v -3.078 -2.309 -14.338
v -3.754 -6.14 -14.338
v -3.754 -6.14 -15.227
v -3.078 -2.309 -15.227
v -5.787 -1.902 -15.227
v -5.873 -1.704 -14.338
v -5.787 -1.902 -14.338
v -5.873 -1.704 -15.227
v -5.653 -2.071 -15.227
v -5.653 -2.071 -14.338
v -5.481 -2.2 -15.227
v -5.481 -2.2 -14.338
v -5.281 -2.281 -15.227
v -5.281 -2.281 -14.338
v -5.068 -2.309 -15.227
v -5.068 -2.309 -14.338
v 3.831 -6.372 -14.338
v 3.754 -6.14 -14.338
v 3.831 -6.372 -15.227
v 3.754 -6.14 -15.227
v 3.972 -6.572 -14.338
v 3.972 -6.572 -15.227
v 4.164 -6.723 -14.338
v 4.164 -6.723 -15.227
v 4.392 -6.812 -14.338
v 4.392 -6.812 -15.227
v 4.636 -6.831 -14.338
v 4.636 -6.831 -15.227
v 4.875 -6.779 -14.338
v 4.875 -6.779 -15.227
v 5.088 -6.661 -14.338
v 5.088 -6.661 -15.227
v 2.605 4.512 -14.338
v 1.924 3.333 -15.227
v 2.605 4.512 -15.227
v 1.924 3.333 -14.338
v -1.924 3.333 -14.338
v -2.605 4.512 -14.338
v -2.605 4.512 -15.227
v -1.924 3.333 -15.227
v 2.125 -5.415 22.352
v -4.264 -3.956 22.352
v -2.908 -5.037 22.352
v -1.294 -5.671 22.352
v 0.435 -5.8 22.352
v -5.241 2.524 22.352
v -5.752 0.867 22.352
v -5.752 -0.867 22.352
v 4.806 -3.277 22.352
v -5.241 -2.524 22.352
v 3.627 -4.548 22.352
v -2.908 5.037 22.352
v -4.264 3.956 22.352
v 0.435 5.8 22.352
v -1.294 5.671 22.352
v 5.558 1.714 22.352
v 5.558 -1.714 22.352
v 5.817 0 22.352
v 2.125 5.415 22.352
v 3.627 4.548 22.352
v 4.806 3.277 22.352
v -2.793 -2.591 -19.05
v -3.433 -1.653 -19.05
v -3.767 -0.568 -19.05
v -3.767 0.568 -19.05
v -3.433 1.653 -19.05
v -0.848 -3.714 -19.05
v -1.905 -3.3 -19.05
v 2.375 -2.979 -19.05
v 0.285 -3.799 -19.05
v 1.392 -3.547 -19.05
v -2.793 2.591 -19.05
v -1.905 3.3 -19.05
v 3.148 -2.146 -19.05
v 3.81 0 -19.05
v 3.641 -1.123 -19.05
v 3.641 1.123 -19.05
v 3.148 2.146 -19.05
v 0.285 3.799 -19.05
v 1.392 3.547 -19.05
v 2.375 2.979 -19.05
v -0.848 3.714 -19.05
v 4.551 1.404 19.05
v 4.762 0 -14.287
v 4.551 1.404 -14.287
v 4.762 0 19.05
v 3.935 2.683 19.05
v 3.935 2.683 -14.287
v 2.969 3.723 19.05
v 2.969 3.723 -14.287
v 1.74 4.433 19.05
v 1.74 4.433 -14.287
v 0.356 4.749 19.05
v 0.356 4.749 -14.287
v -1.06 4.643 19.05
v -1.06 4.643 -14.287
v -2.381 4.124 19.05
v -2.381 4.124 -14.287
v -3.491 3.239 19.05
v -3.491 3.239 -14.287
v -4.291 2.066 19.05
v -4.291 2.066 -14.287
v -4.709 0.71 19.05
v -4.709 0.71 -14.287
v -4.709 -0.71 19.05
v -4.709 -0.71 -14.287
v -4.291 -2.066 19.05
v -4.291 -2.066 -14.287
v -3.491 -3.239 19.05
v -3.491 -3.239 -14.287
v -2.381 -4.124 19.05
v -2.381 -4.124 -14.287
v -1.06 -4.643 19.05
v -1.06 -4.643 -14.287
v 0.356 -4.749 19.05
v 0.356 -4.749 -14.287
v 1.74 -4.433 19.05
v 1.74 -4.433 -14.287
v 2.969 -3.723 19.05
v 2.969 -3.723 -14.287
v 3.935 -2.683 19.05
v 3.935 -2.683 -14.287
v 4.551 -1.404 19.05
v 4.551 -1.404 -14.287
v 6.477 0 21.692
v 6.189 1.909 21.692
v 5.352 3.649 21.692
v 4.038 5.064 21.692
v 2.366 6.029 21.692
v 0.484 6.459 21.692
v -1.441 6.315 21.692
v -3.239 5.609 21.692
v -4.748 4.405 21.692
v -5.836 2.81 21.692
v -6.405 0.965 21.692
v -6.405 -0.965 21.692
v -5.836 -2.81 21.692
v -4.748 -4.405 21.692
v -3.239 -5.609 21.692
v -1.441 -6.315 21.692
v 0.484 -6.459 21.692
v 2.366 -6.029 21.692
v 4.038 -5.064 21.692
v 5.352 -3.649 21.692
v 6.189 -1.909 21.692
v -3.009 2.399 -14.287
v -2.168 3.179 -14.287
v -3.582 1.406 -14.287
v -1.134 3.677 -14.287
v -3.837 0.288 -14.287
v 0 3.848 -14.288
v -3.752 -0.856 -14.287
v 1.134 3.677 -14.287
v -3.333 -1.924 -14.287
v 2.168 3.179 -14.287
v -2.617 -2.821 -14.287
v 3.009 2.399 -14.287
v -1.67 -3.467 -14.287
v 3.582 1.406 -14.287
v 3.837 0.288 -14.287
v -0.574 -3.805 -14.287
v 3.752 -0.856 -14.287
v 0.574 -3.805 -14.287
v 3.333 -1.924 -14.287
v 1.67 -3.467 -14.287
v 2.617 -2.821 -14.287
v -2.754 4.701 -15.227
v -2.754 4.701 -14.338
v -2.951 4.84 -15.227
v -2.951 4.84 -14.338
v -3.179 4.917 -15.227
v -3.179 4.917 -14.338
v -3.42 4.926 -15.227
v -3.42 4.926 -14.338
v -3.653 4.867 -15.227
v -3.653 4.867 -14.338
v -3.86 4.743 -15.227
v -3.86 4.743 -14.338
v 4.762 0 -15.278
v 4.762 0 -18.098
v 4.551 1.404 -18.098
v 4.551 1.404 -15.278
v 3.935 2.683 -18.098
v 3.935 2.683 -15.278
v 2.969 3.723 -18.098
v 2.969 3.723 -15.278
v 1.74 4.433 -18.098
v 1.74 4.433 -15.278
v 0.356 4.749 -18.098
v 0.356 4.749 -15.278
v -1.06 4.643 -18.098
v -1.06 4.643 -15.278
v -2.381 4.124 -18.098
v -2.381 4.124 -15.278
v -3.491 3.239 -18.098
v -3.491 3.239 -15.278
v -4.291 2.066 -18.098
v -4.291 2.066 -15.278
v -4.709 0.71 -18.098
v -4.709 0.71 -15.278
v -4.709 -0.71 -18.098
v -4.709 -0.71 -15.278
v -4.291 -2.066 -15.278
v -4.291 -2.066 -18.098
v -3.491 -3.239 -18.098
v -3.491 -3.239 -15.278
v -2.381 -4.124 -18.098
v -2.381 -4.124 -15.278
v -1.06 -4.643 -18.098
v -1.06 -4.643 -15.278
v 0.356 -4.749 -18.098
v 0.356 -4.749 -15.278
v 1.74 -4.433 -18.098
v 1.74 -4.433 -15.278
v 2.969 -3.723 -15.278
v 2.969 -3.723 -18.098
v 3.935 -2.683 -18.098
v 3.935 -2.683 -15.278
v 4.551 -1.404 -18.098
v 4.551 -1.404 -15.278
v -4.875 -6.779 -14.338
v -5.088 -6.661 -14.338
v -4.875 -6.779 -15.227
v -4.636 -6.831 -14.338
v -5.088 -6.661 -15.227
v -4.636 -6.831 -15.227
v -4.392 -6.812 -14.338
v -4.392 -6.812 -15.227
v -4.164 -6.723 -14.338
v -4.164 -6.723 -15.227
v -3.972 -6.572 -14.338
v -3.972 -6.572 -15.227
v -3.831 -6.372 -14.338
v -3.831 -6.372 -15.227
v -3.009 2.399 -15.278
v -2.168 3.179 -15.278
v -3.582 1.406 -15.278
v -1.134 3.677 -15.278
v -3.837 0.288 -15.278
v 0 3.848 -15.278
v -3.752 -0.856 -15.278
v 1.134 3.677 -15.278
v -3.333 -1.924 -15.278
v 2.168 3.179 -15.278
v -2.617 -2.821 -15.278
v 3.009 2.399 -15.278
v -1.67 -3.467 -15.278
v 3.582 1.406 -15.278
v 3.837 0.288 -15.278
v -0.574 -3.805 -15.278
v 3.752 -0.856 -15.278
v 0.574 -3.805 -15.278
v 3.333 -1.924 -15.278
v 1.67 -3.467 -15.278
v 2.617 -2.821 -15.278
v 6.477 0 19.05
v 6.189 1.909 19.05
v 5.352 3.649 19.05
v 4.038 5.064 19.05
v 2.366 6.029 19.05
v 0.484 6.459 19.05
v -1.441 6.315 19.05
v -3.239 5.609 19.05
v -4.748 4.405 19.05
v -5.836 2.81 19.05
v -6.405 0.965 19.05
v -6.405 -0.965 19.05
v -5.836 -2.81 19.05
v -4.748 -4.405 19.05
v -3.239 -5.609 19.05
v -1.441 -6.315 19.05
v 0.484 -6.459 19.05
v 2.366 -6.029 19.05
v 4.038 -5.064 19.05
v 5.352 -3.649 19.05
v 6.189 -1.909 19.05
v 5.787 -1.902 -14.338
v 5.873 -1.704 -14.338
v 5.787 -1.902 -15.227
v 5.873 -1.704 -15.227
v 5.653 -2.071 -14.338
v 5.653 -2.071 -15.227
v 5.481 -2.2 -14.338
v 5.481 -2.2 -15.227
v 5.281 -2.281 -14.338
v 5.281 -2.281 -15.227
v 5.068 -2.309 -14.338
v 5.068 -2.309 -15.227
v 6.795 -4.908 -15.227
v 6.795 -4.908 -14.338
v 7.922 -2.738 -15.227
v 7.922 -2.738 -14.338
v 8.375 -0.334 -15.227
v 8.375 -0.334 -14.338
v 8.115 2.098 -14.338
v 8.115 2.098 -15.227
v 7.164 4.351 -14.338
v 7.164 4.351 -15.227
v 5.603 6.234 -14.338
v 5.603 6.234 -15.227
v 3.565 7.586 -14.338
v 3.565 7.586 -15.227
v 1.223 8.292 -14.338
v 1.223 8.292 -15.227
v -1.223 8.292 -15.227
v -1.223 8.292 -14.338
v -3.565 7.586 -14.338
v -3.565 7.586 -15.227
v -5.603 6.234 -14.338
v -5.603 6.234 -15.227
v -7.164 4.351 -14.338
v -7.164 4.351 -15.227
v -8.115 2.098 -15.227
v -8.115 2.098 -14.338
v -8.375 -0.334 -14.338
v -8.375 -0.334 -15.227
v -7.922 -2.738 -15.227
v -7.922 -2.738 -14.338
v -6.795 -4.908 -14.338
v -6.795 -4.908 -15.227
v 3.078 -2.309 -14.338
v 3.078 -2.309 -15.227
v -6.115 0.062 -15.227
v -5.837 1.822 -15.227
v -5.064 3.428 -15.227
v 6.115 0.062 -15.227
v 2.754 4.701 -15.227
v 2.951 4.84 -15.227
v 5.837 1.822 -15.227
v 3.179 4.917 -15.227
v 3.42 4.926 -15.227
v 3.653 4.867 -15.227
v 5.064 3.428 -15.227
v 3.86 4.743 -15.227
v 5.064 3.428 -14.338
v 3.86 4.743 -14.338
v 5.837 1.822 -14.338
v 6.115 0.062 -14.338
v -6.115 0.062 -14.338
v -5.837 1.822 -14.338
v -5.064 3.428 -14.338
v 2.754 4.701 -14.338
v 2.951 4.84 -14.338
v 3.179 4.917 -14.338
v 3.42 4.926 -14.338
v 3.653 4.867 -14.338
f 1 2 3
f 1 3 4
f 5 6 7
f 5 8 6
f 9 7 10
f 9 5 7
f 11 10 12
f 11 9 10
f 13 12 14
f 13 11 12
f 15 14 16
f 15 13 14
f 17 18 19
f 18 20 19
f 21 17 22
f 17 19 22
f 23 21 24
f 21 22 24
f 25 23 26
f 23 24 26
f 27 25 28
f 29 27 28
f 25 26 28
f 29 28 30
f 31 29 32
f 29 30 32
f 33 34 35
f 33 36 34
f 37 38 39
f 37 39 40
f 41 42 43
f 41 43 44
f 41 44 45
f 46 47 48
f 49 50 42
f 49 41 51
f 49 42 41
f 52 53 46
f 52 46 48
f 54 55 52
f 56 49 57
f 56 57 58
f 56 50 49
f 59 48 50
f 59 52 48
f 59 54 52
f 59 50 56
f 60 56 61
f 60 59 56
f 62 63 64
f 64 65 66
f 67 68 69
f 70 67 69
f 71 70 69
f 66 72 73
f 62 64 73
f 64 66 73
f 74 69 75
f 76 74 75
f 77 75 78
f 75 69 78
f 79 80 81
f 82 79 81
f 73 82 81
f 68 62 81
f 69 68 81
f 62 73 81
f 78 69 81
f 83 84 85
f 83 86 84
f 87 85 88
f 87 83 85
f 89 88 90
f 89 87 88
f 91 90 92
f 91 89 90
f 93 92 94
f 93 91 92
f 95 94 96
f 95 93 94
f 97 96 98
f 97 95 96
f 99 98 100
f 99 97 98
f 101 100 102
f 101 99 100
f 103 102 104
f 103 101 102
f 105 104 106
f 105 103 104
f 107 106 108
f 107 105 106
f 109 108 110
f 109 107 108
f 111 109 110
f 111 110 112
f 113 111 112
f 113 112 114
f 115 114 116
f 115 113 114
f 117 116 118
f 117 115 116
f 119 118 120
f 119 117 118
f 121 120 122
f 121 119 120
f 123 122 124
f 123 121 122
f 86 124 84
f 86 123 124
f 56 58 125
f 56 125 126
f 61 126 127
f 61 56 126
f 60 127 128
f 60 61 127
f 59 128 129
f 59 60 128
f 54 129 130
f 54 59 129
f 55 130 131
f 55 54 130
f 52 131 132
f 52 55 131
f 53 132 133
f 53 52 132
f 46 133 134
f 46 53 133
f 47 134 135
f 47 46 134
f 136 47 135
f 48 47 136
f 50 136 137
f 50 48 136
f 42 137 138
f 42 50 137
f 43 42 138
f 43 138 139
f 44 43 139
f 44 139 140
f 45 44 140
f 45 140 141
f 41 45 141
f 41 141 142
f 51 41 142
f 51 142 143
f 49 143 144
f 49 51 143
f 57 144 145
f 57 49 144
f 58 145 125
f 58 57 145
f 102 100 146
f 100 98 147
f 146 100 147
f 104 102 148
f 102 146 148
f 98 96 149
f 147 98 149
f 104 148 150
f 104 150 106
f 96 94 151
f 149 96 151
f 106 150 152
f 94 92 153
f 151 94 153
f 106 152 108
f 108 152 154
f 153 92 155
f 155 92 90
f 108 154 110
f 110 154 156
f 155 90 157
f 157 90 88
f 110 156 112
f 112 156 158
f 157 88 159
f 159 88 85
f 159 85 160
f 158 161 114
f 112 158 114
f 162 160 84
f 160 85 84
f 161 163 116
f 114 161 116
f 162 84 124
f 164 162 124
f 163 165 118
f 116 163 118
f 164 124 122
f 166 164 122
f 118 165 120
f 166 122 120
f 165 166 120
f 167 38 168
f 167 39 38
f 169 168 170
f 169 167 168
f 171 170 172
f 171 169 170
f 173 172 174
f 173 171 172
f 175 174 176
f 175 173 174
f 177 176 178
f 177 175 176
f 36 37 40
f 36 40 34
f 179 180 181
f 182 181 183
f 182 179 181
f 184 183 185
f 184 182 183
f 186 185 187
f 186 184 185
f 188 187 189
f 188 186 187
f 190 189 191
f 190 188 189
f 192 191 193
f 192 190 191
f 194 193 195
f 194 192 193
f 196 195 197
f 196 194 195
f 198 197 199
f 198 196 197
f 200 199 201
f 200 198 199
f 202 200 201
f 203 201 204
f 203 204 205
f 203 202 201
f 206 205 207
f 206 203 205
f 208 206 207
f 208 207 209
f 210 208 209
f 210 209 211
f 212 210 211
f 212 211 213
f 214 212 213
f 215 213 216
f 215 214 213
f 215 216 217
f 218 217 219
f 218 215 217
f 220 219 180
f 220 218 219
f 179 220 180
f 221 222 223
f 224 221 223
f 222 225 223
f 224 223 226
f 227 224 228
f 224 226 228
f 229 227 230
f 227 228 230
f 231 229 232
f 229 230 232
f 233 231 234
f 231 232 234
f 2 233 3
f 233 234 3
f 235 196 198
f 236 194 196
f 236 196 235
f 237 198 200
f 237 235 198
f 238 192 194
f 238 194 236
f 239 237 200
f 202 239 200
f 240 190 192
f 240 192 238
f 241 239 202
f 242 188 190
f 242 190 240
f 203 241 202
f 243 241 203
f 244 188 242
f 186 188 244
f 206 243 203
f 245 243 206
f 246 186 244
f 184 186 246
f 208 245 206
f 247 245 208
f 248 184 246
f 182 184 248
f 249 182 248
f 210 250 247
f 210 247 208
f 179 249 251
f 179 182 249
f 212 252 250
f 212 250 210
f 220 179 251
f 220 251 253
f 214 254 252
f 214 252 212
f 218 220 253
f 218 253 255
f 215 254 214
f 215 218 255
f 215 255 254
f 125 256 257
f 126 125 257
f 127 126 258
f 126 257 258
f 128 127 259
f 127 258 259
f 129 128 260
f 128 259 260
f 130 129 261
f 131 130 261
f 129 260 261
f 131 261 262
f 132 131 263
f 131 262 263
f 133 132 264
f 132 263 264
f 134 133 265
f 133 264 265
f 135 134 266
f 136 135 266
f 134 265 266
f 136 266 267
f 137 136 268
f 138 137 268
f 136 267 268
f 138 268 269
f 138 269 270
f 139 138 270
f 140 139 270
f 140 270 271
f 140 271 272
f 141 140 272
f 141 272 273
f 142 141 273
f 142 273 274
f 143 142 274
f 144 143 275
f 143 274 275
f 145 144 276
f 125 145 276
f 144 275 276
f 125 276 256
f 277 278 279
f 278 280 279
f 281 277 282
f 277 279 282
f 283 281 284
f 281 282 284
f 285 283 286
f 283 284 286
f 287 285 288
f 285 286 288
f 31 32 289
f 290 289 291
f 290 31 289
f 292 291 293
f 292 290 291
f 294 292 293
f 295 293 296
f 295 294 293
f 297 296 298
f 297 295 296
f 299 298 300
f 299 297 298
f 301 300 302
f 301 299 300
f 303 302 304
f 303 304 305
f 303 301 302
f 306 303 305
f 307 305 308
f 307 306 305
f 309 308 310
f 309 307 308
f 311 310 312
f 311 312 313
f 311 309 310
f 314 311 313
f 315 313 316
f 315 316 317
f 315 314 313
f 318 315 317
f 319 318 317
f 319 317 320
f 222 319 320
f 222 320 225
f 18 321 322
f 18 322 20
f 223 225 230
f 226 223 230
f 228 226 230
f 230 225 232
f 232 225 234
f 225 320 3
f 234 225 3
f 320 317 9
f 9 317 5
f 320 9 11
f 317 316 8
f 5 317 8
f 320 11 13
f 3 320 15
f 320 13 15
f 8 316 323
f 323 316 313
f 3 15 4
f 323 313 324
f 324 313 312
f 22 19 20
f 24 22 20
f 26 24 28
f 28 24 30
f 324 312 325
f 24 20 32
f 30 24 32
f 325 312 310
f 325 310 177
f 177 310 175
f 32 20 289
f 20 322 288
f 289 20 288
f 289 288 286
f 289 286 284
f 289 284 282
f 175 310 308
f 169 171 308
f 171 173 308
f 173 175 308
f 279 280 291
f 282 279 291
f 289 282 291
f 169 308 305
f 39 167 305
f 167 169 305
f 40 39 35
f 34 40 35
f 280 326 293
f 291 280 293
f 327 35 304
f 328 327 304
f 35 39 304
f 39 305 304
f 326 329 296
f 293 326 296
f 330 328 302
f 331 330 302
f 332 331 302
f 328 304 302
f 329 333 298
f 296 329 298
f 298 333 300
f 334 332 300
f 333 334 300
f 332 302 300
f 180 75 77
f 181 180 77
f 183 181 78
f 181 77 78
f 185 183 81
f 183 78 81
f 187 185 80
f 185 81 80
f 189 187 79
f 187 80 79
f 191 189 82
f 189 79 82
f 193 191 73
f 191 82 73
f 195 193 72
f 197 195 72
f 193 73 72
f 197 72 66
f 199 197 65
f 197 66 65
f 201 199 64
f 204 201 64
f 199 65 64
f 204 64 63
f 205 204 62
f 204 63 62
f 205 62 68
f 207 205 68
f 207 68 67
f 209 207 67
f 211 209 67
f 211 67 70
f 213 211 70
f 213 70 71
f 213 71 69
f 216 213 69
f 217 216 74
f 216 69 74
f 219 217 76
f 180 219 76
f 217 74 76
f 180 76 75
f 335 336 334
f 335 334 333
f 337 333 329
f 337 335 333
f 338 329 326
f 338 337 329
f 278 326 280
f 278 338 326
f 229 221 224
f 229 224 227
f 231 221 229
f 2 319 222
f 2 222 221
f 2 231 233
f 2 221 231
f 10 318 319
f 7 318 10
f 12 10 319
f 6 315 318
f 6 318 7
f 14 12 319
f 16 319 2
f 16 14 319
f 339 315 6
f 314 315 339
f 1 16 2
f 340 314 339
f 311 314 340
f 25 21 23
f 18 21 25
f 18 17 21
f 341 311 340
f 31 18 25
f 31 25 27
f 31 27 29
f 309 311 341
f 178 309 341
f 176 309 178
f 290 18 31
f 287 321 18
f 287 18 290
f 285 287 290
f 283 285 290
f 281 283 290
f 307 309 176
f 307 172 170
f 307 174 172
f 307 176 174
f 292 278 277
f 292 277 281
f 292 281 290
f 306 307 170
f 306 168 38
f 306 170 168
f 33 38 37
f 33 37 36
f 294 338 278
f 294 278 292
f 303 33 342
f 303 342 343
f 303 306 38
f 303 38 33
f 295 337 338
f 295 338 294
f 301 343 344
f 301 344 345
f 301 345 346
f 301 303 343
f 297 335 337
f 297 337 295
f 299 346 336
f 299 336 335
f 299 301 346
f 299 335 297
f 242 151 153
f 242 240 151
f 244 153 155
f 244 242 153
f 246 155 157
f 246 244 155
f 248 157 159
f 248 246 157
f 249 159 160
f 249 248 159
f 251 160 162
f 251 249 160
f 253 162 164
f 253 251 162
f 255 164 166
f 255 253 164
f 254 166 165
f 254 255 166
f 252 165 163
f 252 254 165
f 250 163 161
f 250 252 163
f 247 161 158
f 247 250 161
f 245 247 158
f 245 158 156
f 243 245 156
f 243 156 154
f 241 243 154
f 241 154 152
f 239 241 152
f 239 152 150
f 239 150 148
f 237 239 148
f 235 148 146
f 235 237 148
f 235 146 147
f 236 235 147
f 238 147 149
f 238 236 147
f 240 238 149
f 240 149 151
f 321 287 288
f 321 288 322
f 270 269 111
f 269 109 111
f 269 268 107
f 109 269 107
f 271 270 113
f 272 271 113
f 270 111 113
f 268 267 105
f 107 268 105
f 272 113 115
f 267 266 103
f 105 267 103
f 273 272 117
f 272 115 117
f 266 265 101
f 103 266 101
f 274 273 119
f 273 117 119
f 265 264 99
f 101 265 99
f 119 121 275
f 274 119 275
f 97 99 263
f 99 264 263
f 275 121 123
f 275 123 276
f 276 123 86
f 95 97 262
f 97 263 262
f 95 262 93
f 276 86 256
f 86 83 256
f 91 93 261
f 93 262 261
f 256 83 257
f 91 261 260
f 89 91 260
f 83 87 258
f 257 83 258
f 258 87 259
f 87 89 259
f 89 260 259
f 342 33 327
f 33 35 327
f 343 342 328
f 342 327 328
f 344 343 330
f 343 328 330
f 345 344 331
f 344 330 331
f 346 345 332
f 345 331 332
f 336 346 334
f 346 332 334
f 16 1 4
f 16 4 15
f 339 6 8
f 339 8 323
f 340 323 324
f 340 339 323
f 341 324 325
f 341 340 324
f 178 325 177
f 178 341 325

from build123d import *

# Parameters (mm, degrees)
SKETCH2_R      = 4.7625
EXTRUDE1_DEPTH = 19.05
SKETCH3_W      = 0.9906
SKETCH3_H      = 0.9144
SKETCH8_R      = 6.477
EXTRUDE6_DEPTH = 3.302
CHAMFER2_SIZE  = 0.6604
SKETCH4_R      = 8.382
SKETCH4_R_2    = 3.8481
EXTRUDE2_DEPTH = 0.4445
EXTRUDE4_DEPTH = 20.05
EXTRUDE5_DEPTH = 0.889
FILLET1_R      = 0.8382
CHAMFER1_SIZE  = 0.9525


with BuildPart() as part:
    # Sketch2 → Extrude1 (new body, symmetric)
    with BuildSketch(Plane.XY):
        Circle(SKETCH2_R)
    extrude(amount=EXTRUDE1_DEPTH, both=True)

    # Sketch3 → Cut-Revolve1 (revolve, cut)
    with BuildSketch(Plane(origin=(0, 0, 0), x_dir=(0, 0, -1), z_dir=(1, 0, 0))):
        with Locations((14.7828, 4.3053)):
            Rectangle(SKETCH3_W, SKETCH3_H)
    revolve(axis=Axis((0, 0, 19.05), (0, 0, -1)), mode=Mode.SUBTRACT)

    # Sketch8 → Extrude6 (add)
    with BuildSketch(Plane.XY.offset(19.05)):
        Circle(SKETCH8_R)
    extrude(amount=EXTRUDE6_DEPTH)

    # Chamfer2
    chamfer2_edges = [part.edges().sort_by_distance(p)[0] for p in [
        (-6.477, 0, 22.352),
    ]]
    chamfer(chamfer2_edges, length=CHAMFER2_SIZE)

    # Chamfer1
    chamfer1_edges = [part.edges().sort_by_distance(p)[0] for p in [
        (-4.7625, 0, -19.05),
    ]]
    chamfer(chamfer1_edges, length=CHAMFER1_SIZE)


with BuildPart() as body_2:
    # Sketch4 → Extrude2 (new body, symmetric)
    with BuildSketch(Plane.XY.offset(-14.7828)):
        Circle(SKETCH4_R)
        Circle(SKETCH4_R_2, mode=Mode.SUBTRACT)
    extrude(amount=EXTRUDE2_DEPTH, both=True)

    # Sketch5 → Extrude4 (cut, through all)
    with BuildSketch(Plane.XY):
        with BuildLine():
            Line((-3.057525, 5.295788645), (0, 0))
            Line((0, 0), (3.057525, 5.295788645))
            ThreePointArc((3.057525, 5.295788645), (5.785069674, 1.981616859), (5.662420154, -2.30886))
            Line((5.662420154, -2.30886), (3.07848, -2.30886))
            Line((3.07848, -2.30886), (3.972784338, -7.380711931))
            ThreePointArc((3.972784338, -7.380711931), (0, -8.382), (-3.972784338, -7.380711931))
            Line((-3.972784338, -7.380711931), (-3.07848, -2.30886))
            Line((-3.07848, -2.30886), (-5.662420154, -2.30886))
            ThreePointArc((-5.662420154, -2.30886), (-5.785069674, 1.981616859), (-3.057525, 5.295788645))
        make_face()
    extrude(amount=-EXTRUDE4_DEPTH, mode=Mode.SUBTRACT)

    # Sketch6 → Extrude5 (add)
    with BuildSketch(Plane.XY.offset(-14.3383)):
        with BuildLine():
            Line((-1.92405, 3.332552356), (1.92405, 3.332552356))
            ThreePointArc((1.92405, 3.332552356), (0, 3.8481), (-1.92405, 3.332552356))
        make_face()
    extrude(amount=-EXTRUDE5_DEPTH)

    # Fillet1
    fillet1_edges = [body_2.edges().sort_by_distance(p)[0] for p in [
        (3.057525, 5.295788645, -14.7828),
        (3.972784338, -7.380711931, -14.7828),
        (-5.662420154, -2.30886, -14.7828),
        (5.662420154, -2.30886, -14.7828),
        (-3.972784338, -7.380711931, -14.7828),
        (-3.057525, 5.295788645, -14.7828),
    ]]
    fillet(fillet1_edges, radius=FILLET1_R)


solid = Compound([part.part, body_2.part])
